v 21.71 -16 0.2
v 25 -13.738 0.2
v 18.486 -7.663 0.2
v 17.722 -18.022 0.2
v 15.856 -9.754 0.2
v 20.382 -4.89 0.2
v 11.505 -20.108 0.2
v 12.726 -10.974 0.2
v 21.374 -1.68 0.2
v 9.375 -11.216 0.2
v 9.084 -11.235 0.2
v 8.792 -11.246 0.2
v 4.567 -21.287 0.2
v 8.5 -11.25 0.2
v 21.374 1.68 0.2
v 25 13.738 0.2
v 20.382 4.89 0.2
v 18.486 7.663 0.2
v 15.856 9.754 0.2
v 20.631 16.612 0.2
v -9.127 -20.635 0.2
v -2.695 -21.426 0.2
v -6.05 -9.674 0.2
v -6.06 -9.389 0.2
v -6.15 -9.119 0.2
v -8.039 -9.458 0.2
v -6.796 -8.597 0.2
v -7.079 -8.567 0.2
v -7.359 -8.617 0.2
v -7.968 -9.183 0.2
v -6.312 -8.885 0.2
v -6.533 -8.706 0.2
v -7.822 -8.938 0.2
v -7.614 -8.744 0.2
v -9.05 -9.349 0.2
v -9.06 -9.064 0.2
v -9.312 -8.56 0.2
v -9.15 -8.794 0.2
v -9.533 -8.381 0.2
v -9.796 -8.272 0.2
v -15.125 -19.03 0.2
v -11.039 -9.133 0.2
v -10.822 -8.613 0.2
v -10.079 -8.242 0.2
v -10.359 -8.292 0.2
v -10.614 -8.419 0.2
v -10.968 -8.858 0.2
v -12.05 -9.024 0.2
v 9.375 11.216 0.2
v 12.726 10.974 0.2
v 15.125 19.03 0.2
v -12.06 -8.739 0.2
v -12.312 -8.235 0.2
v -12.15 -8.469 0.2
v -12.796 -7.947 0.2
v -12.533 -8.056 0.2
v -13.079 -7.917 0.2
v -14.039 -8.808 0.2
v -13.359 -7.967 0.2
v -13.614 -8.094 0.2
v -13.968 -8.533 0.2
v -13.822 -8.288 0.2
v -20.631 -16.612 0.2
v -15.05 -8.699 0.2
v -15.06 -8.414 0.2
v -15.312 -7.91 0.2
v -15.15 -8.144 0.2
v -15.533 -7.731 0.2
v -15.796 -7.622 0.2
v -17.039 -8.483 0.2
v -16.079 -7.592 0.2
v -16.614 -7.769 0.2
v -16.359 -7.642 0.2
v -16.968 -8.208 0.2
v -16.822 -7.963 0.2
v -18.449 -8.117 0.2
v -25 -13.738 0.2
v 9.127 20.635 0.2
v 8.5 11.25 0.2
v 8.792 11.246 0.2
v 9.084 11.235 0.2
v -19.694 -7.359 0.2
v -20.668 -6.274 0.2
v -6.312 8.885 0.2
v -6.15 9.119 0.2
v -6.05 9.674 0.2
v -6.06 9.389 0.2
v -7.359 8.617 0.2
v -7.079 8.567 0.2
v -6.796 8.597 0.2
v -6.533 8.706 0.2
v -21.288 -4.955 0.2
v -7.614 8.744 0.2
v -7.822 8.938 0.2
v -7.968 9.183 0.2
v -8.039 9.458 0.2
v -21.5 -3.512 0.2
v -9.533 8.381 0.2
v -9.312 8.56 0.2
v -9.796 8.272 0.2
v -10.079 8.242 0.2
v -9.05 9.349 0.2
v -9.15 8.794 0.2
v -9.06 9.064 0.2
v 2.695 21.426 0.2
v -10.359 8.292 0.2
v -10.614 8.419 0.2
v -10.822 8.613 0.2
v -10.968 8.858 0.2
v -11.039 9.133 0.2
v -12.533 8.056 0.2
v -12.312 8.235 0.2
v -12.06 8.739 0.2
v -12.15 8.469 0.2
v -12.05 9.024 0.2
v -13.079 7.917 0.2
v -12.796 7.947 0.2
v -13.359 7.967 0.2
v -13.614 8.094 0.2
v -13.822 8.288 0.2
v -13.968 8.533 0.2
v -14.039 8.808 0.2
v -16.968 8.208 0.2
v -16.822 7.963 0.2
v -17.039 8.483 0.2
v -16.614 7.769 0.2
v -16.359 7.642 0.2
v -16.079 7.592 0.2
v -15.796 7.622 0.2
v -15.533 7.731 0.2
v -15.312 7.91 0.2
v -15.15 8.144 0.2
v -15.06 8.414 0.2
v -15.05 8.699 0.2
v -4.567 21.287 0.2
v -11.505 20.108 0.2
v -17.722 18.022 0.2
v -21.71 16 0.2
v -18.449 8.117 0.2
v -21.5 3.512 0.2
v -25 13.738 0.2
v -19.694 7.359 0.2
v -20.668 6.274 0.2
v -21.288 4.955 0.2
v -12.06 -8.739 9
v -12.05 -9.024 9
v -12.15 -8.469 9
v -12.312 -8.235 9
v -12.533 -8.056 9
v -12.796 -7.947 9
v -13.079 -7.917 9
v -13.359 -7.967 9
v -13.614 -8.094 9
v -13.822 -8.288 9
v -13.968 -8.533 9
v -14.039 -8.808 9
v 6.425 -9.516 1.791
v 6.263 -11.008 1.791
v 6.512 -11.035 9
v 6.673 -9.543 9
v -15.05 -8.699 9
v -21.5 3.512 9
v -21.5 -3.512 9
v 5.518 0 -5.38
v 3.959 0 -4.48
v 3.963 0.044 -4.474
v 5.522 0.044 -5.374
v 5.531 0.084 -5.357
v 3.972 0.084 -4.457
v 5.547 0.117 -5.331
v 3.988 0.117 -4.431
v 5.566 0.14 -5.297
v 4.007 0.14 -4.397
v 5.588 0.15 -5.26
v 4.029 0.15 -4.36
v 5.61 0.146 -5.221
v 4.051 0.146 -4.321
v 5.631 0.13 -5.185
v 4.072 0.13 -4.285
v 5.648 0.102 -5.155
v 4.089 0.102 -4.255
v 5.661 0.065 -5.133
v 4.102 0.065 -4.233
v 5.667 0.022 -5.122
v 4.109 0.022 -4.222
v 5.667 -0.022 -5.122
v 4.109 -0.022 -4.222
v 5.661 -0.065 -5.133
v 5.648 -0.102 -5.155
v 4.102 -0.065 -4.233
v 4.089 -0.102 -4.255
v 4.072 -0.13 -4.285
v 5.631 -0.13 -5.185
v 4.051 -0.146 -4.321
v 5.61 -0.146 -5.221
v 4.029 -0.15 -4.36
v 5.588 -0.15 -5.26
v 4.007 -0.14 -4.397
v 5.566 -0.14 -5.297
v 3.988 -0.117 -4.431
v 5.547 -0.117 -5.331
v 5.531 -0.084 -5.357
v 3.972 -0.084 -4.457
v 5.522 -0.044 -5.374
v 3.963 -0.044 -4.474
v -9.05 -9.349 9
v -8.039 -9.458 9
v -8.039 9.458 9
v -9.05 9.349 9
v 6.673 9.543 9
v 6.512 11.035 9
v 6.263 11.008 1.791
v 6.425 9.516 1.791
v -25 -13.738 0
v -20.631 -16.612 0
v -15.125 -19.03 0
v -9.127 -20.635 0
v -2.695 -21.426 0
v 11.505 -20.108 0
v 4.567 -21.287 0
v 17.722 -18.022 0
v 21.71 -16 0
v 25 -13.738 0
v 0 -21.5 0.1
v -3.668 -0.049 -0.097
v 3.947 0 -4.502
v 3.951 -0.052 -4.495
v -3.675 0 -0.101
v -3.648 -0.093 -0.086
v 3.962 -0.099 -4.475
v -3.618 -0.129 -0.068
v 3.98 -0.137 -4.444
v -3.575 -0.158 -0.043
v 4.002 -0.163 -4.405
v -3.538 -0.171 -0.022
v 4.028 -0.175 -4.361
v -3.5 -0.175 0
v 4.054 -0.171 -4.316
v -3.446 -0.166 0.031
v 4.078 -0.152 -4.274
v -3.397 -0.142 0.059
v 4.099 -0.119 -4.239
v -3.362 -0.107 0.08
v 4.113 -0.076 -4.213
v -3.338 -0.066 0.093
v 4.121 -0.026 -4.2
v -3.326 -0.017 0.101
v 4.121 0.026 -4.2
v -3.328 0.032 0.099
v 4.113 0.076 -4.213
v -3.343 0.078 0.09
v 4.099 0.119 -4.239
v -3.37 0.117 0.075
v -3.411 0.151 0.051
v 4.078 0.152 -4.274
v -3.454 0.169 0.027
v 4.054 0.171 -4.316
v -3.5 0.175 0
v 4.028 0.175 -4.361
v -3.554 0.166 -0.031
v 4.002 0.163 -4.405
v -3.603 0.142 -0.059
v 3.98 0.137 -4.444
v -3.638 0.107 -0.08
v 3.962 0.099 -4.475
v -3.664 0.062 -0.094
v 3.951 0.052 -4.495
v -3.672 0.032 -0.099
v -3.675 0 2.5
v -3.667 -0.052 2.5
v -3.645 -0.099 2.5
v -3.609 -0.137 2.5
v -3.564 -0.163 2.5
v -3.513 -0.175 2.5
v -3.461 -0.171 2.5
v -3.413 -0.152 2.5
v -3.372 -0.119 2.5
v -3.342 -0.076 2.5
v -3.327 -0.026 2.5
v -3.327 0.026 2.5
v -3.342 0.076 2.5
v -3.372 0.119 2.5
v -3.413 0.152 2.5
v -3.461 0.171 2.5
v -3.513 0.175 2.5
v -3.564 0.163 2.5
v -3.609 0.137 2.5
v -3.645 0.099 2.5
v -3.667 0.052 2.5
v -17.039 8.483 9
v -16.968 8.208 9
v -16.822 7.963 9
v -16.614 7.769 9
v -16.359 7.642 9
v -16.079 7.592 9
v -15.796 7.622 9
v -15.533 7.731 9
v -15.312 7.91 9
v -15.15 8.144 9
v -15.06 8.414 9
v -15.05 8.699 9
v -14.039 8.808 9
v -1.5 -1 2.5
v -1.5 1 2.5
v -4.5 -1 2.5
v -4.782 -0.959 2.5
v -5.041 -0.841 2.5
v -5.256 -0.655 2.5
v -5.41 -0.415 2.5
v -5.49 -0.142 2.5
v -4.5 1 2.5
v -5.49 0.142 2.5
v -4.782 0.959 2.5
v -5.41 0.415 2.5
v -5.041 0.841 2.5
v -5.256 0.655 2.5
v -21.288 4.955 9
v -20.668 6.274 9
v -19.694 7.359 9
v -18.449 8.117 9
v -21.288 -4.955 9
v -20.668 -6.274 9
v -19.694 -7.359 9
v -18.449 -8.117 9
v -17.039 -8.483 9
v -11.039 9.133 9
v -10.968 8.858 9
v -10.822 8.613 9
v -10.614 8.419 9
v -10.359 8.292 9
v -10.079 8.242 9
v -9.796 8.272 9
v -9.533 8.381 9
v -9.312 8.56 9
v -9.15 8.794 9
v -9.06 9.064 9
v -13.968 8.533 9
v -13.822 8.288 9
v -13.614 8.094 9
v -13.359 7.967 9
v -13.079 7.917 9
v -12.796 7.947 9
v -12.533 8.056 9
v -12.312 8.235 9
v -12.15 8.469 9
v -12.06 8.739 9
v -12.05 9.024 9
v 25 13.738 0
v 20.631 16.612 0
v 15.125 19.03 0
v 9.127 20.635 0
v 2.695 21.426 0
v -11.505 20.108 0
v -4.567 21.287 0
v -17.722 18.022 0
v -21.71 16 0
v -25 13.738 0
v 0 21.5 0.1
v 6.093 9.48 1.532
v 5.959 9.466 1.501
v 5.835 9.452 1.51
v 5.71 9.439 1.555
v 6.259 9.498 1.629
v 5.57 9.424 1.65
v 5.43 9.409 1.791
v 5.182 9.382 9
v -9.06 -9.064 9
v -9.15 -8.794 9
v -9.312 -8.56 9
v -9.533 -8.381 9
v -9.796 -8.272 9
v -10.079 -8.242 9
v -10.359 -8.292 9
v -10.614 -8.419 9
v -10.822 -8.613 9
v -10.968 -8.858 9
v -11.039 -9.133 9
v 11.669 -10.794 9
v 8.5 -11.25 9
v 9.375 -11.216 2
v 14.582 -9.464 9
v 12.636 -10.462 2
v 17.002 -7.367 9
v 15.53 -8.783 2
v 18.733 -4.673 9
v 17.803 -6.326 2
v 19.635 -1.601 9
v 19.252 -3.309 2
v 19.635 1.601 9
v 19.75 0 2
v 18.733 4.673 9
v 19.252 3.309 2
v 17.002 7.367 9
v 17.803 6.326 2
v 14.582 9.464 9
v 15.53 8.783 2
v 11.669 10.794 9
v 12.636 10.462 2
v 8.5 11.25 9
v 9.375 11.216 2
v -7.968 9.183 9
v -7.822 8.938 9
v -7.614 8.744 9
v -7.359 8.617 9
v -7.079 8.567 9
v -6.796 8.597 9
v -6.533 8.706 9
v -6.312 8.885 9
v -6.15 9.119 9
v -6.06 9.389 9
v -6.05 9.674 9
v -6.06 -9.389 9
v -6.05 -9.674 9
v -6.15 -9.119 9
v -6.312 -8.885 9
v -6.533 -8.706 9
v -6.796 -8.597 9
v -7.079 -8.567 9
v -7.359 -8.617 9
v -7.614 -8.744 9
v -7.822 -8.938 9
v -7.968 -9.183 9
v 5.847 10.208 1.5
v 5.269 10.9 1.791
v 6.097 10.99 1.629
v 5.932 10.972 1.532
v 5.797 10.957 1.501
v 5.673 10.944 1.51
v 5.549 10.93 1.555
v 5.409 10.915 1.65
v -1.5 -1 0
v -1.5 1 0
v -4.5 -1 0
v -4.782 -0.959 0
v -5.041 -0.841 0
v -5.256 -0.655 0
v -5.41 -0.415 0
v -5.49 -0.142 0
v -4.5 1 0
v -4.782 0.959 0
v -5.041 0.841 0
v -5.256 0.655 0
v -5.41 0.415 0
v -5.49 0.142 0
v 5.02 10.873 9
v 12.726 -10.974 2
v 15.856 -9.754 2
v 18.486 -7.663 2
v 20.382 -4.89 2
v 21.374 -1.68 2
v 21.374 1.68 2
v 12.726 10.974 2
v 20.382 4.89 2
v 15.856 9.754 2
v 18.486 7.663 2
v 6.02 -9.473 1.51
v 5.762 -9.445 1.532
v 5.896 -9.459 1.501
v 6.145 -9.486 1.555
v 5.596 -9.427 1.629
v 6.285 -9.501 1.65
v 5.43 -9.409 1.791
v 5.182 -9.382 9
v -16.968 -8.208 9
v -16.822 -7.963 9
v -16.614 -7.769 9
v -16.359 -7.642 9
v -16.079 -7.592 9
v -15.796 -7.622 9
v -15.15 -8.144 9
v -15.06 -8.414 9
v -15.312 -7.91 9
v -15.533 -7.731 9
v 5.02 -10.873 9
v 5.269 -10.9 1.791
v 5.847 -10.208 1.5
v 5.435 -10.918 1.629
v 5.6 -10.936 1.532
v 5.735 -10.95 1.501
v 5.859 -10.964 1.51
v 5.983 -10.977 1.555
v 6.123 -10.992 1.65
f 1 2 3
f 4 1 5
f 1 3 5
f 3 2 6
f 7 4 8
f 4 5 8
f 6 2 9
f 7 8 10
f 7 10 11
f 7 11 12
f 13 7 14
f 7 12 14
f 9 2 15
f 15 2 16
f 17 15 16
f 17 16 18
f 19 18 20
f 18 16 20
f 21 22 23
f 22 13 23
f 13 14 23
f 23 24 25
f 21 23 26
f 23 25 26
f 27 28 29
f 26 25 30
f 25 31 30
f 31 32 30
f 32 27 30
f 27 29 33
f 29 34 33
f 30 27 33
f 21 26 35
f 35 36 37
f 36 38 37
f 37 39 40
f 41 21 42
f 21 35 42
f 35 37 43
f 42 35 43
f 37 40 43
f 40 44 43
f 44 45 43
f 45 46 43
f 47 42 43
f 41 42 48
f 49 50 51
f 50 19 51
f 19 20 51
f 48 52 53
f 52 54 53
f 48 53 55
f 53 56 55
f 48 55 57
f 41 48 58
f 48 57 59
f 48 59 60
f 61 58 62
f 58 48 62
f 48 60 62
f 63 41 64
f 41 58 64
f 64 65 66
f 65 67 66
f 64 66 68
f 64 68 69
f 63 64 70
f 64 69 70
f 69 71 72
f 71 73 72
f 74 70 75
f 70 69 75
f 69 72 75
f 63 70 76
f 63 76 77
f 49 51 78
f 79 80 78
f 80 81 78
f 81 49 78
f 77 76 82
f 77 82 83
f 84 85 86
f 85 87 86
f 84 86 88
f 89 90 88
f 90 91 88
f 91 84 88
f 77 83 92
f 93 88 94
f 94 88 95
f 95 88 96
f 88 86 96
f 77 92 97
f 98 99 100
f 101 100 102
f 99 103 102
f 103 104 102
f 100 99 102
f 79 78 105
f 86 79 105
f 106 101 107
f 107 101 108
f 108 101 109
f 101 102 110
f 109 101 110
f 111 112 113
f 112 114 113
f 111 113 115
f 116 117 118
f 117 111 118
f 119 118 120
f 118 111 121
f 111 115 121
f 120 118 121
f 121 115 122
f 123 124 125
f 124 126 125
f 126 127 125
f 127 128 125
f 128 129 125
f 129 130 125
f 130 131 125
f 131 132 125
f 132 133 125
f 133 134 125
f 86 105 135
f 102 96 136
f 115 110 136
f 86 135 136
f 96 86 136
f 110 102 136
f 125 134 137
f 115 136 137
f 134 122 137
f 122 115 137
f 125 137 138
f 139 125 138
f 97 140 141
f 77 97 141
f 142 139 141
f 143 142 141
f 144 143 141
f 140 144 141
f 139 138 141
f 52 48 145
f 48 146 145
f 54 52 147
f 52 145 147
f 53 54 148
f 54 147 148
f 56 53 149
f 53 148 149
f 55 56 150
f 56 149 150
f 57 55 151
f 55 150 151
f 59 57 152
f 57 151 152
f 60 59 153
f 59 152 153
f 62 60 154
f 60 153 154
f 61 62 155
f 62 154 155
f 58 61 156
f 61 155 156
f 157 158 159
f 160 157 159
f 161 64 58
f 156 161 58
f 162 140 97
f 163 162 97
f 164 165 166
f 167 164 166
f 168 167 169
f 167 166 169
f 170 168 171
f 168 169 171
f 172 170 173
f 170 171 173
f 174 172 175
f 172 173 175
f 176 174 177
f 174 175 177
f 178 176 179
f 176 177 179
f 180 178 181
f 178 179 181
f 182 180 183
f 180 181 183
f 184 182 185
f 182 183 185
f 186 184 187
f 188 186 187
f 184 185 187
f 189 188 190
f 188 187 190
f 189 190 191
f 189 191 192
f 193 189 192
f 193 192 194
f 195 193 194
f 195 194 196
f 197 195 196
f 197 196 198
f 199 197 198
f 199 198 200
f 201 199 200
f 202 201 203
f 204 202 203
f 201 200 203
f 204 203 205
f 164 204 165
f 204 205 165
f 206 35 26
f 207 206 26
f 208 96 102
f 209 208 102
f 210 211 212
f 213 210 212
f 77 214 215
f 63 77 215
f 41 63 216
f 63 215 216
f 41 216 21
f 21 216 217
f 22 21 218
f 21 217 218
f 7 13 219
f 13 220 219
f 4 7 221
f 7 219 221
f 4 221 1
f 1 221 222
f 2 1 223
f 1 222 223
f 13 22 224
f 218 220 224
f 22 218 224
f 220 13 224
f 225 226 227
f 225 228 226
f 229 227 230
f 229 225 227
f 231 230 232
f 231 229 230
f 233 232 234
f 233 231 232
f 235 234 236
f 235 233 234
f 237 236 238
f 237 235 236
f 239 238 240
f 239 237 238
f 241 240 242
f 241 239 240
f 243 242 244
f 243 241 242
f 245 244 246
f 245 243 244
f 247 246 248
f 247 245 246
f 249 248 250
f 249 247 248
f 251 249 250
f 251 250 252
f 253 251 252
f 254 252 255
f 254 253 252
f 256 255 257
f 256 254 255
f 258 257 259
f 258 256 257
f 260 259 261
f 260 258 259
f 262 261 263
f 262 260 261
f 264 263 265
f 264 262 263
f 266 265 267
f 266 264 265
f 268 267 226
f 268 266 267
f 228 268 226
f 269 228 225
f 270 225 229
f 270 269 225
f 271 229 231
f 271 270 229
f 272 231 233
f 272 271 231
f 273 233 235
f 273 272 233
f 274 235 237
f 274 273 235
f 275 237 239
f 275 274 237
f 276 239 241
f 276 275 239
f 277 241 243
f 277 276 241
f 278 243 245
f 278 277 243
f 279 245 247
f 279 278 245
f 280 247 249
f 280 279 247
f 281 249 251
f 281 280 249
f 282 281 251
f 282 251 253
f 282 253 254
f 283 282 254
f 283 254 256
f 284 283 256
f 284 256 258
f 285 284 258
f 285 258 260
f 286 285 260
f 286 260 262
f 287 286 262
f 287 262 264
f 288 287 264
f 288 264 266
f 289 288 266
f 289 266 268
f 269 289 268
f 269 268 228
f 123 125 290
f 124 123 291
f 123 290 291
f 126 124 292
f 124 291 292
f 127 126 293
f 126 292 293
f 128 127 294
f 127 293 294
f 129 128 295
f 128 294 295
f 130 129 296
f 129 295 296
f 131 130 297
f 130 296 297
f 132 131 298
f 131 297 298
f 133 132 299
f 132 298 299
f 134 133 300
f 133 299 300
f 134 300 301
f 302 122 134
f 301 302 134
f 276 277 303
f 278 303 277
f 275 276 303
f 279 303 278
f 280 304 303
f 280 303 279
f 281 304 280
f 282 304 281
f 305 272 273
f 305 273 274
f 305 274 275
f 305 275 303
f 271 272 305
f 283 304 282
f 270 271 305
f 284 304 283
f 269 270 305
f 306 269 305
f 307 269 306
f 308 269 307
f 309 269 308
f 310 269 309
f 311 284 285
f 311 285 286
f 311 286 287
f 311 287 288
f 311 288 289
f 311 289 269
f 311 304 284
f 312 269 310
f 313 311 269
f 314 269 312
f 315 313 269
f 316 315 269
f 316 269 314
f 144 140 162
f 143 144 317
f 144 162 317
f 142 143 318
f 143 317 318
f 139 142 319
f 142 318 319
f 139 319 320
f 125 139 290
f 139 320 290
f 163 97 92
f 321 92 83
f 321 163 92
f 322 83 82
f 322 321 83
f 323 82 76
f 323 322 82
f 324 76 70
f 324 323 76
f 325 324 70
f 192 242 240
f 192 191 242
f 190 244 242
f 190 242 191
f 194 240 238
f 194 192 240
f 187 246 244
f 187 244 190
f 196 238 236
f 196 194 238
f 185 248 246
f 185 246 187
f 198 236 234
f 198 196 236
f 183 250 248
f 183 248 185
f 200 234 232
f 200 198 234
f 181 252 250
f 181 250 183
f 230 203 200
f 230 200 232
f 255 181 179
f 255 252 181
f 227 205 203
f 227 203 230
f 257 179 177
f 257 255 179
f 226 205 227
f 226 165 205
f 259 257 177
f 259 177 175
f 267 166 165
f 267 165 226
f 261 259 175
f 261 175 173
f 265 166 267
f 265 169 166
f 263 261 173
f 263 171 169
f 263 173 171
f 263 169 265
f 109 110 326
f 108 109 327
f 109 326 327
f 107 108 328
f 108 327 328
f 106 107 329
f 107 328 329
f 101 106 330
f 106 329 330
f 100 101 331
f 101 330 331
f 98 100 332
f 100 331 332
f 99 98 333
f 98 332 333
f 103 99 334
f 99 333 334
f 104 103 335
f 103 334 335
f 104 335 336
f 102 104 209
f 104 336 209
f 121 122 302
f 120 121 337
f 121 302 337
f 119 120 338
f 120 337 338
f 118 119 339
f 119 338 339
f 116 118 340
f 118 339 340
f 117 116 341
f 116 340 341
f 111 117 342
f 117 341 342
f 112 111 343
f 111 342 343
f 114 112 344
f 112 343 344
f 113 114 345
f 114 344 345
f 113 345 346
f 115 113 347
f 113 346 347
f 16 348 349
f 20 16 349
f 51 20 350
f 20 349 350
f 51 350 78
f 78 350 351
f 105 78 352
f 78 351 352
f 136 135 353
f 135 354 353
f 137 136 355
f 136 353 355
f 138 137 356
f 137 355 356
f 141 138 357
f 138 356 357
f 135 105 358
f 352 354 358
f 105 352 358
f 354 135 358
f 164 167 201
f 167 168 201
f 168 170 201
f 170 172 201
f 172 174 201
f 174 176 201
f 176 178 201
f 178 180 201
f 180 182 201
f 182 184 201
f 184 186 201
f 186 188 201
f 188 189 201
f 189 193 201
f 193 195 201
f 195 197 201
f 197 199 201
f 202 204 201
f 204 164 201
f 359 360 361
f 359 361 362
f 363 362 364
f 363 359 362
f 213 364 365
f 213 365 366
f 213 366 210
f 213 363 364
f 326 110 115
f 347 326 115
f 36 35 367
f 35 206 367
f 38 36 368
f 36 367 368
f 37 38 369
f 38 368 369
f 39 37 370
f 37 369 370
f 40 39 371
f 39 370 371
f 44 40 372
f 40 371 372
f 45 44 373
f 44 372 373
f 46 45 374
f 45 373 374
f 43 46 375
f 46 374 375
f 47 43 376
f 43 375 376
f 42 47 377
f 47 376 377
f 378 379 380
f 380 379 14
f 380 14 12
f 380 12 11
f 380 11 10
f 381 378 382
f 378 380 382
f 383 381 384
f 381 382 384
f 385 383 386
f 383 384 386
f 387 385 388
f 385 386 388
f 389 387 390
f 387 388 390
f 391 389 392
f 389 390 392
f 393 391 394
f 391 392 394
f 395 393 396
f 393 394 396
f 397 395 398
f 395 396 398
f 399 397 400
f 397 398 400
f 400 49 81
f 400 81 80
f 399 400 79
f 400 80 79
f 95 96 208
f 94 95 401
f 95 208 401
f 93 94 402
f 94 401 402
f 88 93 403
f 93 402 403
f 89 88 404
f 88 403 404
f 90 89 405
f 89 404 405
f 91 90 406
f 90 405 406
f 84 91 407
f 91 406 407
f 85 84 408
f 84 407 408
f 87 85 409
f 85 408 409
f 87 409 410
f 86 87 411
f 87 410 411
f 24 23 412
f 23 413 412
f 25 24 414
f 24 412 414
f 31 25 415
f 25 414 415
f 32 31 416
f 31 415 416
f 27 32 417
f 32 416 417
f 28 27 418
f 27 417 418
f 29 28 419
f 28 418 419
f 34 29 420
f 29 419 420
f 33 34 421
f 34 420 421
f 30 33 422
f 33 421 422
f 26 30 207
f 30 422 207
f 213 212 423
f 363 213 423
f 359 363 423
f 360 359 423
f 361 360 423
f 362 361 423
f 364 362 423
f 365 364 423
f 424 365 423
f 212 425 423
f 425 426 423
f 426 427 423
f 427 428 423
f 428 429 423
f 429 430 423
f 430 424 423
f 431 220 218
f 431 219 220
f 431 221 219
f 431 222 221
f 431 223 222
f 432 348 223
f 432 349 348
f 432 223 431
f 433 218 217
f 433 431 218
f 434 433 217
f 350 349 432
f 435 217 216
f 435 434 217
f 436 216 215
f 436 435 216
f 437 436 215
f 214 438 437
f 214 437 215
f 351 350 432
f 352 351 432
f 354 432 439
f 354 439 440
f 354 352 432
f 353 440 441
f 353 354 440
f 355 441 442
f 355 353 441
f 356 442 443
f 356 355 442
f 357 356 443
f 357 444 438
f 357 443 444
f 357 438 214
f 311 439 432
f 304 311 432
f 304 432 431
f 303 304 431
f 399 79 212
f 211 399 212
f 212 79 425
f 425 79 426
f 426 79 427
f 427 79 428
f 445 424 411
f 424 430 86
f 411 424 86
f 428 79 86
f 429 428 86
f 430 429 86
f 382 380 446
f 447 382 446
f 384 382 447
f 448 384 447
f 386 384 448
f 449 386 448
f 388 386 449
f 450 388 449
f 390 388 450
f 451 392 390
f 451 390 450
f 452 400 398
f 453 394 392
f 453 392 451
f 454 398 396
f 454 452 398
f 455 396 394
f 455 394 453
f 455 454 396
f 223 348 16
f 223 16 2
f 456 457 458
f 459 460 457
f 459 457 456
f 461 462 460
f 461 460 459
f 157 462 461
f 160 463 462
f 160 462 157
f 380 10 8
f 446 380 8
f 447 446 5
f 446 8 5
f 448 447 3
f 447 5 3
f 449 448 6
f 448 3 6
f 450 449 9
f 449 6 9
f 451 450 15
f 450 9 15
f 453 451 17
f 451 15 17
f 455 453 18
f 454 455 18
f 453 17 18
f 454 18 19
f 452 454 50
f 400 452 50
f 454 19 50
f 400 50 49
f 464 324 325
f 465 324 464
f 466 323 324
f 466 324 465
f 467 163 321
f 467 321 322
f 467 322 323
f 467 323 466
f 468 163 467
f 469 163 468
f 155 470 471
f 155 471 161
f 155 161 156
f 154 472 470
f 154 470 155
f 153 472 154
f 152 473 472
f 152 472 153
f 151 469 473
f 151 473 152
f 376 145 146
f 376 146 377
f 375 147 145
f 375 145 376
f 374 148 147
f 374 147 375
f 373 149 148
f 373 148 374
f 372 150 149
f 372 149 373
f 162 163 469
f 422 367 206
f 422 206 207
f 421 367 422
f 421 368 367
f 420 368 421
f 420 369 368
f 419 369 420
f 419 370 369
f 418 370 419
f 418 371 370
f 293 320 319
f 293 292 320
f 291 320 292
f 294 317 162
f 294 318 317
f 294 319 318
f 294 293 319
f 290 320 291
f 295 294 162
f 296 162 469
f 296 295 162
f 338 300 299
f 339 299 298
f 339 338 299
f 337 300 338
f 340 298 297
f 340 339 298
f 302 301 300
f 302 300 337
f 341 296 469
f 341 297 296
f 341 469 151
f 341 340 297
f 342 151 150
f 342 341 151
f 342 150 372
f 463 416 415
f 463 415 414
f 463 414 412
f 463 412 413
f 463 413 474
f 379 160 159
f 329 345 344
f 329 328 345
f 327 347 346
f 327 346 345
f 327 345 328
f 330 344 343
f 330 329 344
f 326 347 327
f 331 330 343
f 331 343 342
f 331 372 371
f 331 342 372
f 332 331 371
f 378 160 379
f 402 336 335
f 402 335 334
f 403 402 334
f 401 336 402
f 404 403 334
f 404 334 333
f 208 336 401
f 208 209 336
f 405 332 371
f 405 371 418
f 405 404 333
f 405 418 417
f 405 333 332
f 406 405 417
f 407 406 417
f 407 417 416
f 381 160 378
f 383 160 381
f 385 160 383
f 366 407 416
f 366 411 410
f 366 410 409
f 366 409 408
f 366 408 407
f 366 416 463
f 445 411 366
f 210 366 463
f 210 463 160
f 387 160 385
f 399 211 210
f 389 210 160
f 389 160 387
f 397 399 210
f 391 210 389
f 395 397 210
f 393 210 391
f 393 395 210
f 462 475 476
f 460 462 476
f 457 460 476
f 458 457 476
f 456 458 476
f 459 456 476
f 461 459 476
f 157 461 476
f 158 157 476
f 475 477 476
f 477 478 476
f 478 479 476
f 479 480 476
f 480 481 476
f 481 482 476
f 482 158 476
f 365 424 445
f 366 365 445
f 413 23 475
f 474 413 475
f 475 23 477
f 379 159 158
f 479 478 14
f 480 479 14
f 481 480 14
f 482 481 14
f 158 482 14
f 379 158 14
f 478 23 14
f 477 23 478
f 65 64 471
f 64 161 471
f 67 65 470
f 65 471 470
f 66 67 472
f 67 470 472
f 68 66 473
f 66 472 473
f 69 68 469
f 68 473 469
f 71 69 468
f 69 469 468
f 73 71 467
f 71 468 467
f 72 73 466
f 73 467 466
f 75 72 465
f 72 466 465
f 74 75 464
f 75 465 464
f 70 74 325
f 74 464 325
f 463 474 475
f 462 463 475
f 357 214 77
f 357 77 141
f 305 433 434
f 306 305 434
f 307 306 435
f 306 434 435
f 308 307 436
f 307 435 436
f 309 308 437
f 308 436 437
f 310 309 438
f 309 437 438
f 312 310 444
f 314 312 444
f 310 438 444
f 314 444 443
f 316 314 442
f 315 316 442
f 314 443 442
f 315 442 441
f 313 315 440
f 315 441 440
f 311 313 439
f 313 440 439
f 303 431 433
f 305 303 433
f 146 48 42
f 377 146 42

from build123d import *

# Parameters (mm, degrees)
SENSOR_HEIGHT_DEPTH               = 9
SENSOR_LIP_HEIGHT_DEPTH           = 2
SHORT_SIDE_EDGE_ROUNDING_R        = 5
PATCH_DEPTH                       = 0.2
SENSOR_HOLES_R                    = 1
EXTRUDED_SENSOR_HOLES_DEPTH       = 8.8
BOTTOM_TRIANGLE_CUT_DEPTH         = 1.5
TOP_TRIANGLE_CUT_DEPTH            = 1.5
FILAMENT_HOLE_CUT_DEPTH           = 2.5
FILAMENT_PROFILE_R                = 0.175
SENSING_START                     = -1.8
SENSING_FILAMENT_R                = 0.175
SENSING_FILAMENT_R_2              = 0.15
SENSING_PORTION_OF_FILAMENT_DEPTH = 1.8


# Read off the part's stored shape, not the designer's step: Sensor Lip Height
with BuildPart() as part:
    # Basic Sensor Dimensions → Sensor Height (new body)
    with BuildSketch(Plane.XY):
        with BuildLine():
            Line((-21.5, 8), (-21.5, -8))
            Line((-21.5, -8), (8.5, -11.25))
            ThreePointArc((8.5, -11.25), (19.75, 0), (8.5, 11.25))
            Line((8.5, 11.25), (-21.5, 8))
        make_face()
    extrude(amount=SENSOR_HEIGHT_DEPTH)

    # Sensor Lip Height outline → Sensor Lip Height (add)
    with BuildSketch(Plane.XY):
        with BuildLine():
            ThreePointArc((9.375, -11.215920604), (21.5, 0), (9.375, 11.215920604))
            ThreePointArc((9.375, 11.215920604), (19.75, 0), (9.375, -11.215920604))
        make_face()
    extrude(amount=SENSOR_LIP_HEIGHT_DEPTH)

    # Short Side Edge Rounding
    short_side_edge_rounding_edges = [part.edges().sort_by_distance(p)[0] for p in [
        (-21.5, -8, 4.5),
        (-21.5, 8, 4.5),
    ]]
    fillet(short_side_edge_rounding_edges, radius=SHORT_SIDE_EDGE_ROUNDING_R)

    # Basic Sensor Dimensions<7> → Patch (add)
    with BuildSketch(Plane.XY):
        with BuildLine():
            Line((25, 13.737877927), (25, -13.737877927))
            add(Edge.make_bspline(
                [(-25, -13.737877927), (0, -33.647845937), (25, -13.737877927)],
                knots=[3.834752561, 3.834752561, 3.834752561, 5.5900254, 5.5900254, 5.5900254], degree=2, weights=[1, 0.638971066, 1]))
            Line((-25, -13.737877927), (-25, 13.737877927))
            add(Edge.make_bspline(
                [(25, 13.737877927), (0, 33.647845937), (-25, 13.737877927)],
                knots=[0.693159908, 0.693159908, 0.693159908, 2.448432746, 2.448432746, 2.448432746], degree=2, weights=[1, 0.638971066, 1]))
        make_face()
    extrude(amount=PATCH_DEPTH)

    # Sensor Holes → Extruded Sensor Holes (cut)
    with BuildSketch(Plane.XY.offset(9)):
        with Locations((-16.044332748, -8.591030619)):
            Circle(SENSOR_HOLES_R)
        with Locations((-13.044332748, -8.916030619)):
            Circle(SENSOR_HOLES_R)
        with Locations((-10.044332748, -9.241030619)):
            Circle(SENSOR_HOLES_R)
        with Locations((-7.044332748, -9.566030619)):
            Circle(SENSOR_HOLES_R)
        with Locations((-10.044332748, 9.241030619)):
            Circle(SENSOR_HOLES_R)
        with Locations((-7.044332748, 9.566030619)):
            Circle(SENSOR_HOLES_R)
        with Locations((-13.044332748, 8.916030619)):
            Circle(SENSOR_HOLES_R)
        with Locations((-16.044332748, 8.591030619)):
            Circle(SENSOR_HOLES_R)
    extrude(amount=-EXTRUDED_SENSOR_HOLES_DEPTH, mode=Mode.SUBTRACT)

    # Bottom Triangle → Bottom Triangle Cut (cut)
    with BuildSketch(Plane(origin=(-1.106012767, -10.209348617, 0), x_dir=(0.9941830955390242, -0.10770316868339427, 0), z_dir=(-0.10770316868339427, -0.9941830955390242, 0))):
        with BuildLine():
            Line((6.91221696, 1.5), (6.91221696, 9))
            Line((6.91221696, 9), (6.16221696, 9))
            Line((6.16221696, 9), (6.41221696, 1.790726708))
            add(Edge.make_bspline(
                [(6.41221696, 1.790726708), (6.66221696, 1.5), (6.91221696, 1.5)],
                knots=[0, 0, 0, 0.5, 0.5, 0.5], degree=2))
        make_face()
        with BuildLine():
            Line((7.41221696, 1.790726708), (7.66221696, 9))
            Line((7.66221696, 9), (6.91221696, 9))
            Line((6.91221696, 9), (6.91221696, 1.5))
            add(Edge.make_bspline(
                [(6.91221696, 1.5), (7.16221696, 1.5), (7.41221696, 1.790726708)],
                knots=[0.5, 0.5, 0.5, 1, 1, 1], degree=2))
        make_face()
    extrude(amount=-BOTTOM_TRIANGLE_CUT_DEPTH, mode=Mode.SUBTRACT)

    # Top Triangle → Top Triangle Cut (cut)
    with BuildSketch(Plane(origin=(-1.106012767, 10.209348617, 0), x_dir=(0.9941830955390242, 0.10770316868339432, 0), z_dir=(-0.10770316868339432, 0.9941830955390242, 0))):
        with BuildLine():
            Line((6.91221696, -9), (7.66221696, -9))
            Line((7.66221696, -9), (7.41221696, -1.790726708))
            add(Edge.make_bspline(
                [(6.91221696, -1.5), (7.16221696, -1.5), (7.41221696, -1.790726708)],
                knots=[0.5, 0.5, 0.5, 1, 1, 1], degree=2))
            Line((6.91221696, -1.5), (6.91221696, -9))
        make_face()
        with BuildLine():
            Line((6.16221696, -9), (6.91221696, -9))
            Line((6.91221696, -9), (6.91221696, -1.5))
            add(Edge.make_bspline(
                [(6.41221696, -1.790726708), (6.66221696, -1.5), (6.91221696, -1.5)],
                knots=[0, 0, 0, 0.5, 0.5, 0.5], degree=2))
            Line((6.41221696, -1.790726708), (6.16221696, -9))
        make_face()
    extrude(amount=-TOP_TRIANGLE_CUT_DEPTH, mode=Mode.SUBTRACT)

    # Filament Hole → Filament Hole Cut (cut)
    with BuildSketch(Plane(origin=(0, 0, 0), x_dir=(-1, 0, 0), z_dir=(0, 0, -1))):
        with BuildLine():
            Line((4.5, 1), (1.5, 1))
            Line((1.5, 1), (1.5, -1))
            Line((1.5, -1), (4.5, -1))
            ThreePointArc((4.5, -1), (5.5, 0), (4.5, 1))
        make_face()
    extrude(amount=-FILAMENT_HOLE_CUT_DEPTH, mode=Mode.SUBTRACT)

    # Filament: sweep along a curve in space
    with BuildLine() as filament_path:
        Line((-3.5, 0, 0), (-3.5, 0, 2.5))
        Line((-3.5, 0, 0), (5.59326674, 0, -5.25))
    # Filament profile (on start of the path) → Filament (sweep)
    with BuildSketch(Plane(origin=(5.59326674, 0, -5.25), x_dir=(-0.500000000000001, 0, -0.866025403784438), z_dir=(-0.866025403784438, -1.4044495267806857e-15, 0.500000000000001))):
        Circle(FILAMENT_PROFILE_R)
    sweep(path=filament_path.line, transition=Transition.RIGHT)

    # Sensing Filament → Sensing Portion of Filament (cut)
    with BuildSketch(Plane(origin=(6.46826674, 0, -3.734455543), x_dir=(-0.500000000000001, 0, -0.866025403784438), z_dir=(0.866025403784438, 1.066393786355781e-15, -0.500000000000001)).offset(SENSING_START)):
        with Locations((1.75, 0)):
            Circle(SENSING_FILAMENT_R)
        with Locations((1.75, 0)):
            Circle(SENSING_FILAMENT_R_2, mode=Mode.SUBTRACT)
    extrude(amount=SENSING_PORTION_OF_FILAMENT_DEPTH, mode=Mode.SUBTRACT)


solid = part.part
